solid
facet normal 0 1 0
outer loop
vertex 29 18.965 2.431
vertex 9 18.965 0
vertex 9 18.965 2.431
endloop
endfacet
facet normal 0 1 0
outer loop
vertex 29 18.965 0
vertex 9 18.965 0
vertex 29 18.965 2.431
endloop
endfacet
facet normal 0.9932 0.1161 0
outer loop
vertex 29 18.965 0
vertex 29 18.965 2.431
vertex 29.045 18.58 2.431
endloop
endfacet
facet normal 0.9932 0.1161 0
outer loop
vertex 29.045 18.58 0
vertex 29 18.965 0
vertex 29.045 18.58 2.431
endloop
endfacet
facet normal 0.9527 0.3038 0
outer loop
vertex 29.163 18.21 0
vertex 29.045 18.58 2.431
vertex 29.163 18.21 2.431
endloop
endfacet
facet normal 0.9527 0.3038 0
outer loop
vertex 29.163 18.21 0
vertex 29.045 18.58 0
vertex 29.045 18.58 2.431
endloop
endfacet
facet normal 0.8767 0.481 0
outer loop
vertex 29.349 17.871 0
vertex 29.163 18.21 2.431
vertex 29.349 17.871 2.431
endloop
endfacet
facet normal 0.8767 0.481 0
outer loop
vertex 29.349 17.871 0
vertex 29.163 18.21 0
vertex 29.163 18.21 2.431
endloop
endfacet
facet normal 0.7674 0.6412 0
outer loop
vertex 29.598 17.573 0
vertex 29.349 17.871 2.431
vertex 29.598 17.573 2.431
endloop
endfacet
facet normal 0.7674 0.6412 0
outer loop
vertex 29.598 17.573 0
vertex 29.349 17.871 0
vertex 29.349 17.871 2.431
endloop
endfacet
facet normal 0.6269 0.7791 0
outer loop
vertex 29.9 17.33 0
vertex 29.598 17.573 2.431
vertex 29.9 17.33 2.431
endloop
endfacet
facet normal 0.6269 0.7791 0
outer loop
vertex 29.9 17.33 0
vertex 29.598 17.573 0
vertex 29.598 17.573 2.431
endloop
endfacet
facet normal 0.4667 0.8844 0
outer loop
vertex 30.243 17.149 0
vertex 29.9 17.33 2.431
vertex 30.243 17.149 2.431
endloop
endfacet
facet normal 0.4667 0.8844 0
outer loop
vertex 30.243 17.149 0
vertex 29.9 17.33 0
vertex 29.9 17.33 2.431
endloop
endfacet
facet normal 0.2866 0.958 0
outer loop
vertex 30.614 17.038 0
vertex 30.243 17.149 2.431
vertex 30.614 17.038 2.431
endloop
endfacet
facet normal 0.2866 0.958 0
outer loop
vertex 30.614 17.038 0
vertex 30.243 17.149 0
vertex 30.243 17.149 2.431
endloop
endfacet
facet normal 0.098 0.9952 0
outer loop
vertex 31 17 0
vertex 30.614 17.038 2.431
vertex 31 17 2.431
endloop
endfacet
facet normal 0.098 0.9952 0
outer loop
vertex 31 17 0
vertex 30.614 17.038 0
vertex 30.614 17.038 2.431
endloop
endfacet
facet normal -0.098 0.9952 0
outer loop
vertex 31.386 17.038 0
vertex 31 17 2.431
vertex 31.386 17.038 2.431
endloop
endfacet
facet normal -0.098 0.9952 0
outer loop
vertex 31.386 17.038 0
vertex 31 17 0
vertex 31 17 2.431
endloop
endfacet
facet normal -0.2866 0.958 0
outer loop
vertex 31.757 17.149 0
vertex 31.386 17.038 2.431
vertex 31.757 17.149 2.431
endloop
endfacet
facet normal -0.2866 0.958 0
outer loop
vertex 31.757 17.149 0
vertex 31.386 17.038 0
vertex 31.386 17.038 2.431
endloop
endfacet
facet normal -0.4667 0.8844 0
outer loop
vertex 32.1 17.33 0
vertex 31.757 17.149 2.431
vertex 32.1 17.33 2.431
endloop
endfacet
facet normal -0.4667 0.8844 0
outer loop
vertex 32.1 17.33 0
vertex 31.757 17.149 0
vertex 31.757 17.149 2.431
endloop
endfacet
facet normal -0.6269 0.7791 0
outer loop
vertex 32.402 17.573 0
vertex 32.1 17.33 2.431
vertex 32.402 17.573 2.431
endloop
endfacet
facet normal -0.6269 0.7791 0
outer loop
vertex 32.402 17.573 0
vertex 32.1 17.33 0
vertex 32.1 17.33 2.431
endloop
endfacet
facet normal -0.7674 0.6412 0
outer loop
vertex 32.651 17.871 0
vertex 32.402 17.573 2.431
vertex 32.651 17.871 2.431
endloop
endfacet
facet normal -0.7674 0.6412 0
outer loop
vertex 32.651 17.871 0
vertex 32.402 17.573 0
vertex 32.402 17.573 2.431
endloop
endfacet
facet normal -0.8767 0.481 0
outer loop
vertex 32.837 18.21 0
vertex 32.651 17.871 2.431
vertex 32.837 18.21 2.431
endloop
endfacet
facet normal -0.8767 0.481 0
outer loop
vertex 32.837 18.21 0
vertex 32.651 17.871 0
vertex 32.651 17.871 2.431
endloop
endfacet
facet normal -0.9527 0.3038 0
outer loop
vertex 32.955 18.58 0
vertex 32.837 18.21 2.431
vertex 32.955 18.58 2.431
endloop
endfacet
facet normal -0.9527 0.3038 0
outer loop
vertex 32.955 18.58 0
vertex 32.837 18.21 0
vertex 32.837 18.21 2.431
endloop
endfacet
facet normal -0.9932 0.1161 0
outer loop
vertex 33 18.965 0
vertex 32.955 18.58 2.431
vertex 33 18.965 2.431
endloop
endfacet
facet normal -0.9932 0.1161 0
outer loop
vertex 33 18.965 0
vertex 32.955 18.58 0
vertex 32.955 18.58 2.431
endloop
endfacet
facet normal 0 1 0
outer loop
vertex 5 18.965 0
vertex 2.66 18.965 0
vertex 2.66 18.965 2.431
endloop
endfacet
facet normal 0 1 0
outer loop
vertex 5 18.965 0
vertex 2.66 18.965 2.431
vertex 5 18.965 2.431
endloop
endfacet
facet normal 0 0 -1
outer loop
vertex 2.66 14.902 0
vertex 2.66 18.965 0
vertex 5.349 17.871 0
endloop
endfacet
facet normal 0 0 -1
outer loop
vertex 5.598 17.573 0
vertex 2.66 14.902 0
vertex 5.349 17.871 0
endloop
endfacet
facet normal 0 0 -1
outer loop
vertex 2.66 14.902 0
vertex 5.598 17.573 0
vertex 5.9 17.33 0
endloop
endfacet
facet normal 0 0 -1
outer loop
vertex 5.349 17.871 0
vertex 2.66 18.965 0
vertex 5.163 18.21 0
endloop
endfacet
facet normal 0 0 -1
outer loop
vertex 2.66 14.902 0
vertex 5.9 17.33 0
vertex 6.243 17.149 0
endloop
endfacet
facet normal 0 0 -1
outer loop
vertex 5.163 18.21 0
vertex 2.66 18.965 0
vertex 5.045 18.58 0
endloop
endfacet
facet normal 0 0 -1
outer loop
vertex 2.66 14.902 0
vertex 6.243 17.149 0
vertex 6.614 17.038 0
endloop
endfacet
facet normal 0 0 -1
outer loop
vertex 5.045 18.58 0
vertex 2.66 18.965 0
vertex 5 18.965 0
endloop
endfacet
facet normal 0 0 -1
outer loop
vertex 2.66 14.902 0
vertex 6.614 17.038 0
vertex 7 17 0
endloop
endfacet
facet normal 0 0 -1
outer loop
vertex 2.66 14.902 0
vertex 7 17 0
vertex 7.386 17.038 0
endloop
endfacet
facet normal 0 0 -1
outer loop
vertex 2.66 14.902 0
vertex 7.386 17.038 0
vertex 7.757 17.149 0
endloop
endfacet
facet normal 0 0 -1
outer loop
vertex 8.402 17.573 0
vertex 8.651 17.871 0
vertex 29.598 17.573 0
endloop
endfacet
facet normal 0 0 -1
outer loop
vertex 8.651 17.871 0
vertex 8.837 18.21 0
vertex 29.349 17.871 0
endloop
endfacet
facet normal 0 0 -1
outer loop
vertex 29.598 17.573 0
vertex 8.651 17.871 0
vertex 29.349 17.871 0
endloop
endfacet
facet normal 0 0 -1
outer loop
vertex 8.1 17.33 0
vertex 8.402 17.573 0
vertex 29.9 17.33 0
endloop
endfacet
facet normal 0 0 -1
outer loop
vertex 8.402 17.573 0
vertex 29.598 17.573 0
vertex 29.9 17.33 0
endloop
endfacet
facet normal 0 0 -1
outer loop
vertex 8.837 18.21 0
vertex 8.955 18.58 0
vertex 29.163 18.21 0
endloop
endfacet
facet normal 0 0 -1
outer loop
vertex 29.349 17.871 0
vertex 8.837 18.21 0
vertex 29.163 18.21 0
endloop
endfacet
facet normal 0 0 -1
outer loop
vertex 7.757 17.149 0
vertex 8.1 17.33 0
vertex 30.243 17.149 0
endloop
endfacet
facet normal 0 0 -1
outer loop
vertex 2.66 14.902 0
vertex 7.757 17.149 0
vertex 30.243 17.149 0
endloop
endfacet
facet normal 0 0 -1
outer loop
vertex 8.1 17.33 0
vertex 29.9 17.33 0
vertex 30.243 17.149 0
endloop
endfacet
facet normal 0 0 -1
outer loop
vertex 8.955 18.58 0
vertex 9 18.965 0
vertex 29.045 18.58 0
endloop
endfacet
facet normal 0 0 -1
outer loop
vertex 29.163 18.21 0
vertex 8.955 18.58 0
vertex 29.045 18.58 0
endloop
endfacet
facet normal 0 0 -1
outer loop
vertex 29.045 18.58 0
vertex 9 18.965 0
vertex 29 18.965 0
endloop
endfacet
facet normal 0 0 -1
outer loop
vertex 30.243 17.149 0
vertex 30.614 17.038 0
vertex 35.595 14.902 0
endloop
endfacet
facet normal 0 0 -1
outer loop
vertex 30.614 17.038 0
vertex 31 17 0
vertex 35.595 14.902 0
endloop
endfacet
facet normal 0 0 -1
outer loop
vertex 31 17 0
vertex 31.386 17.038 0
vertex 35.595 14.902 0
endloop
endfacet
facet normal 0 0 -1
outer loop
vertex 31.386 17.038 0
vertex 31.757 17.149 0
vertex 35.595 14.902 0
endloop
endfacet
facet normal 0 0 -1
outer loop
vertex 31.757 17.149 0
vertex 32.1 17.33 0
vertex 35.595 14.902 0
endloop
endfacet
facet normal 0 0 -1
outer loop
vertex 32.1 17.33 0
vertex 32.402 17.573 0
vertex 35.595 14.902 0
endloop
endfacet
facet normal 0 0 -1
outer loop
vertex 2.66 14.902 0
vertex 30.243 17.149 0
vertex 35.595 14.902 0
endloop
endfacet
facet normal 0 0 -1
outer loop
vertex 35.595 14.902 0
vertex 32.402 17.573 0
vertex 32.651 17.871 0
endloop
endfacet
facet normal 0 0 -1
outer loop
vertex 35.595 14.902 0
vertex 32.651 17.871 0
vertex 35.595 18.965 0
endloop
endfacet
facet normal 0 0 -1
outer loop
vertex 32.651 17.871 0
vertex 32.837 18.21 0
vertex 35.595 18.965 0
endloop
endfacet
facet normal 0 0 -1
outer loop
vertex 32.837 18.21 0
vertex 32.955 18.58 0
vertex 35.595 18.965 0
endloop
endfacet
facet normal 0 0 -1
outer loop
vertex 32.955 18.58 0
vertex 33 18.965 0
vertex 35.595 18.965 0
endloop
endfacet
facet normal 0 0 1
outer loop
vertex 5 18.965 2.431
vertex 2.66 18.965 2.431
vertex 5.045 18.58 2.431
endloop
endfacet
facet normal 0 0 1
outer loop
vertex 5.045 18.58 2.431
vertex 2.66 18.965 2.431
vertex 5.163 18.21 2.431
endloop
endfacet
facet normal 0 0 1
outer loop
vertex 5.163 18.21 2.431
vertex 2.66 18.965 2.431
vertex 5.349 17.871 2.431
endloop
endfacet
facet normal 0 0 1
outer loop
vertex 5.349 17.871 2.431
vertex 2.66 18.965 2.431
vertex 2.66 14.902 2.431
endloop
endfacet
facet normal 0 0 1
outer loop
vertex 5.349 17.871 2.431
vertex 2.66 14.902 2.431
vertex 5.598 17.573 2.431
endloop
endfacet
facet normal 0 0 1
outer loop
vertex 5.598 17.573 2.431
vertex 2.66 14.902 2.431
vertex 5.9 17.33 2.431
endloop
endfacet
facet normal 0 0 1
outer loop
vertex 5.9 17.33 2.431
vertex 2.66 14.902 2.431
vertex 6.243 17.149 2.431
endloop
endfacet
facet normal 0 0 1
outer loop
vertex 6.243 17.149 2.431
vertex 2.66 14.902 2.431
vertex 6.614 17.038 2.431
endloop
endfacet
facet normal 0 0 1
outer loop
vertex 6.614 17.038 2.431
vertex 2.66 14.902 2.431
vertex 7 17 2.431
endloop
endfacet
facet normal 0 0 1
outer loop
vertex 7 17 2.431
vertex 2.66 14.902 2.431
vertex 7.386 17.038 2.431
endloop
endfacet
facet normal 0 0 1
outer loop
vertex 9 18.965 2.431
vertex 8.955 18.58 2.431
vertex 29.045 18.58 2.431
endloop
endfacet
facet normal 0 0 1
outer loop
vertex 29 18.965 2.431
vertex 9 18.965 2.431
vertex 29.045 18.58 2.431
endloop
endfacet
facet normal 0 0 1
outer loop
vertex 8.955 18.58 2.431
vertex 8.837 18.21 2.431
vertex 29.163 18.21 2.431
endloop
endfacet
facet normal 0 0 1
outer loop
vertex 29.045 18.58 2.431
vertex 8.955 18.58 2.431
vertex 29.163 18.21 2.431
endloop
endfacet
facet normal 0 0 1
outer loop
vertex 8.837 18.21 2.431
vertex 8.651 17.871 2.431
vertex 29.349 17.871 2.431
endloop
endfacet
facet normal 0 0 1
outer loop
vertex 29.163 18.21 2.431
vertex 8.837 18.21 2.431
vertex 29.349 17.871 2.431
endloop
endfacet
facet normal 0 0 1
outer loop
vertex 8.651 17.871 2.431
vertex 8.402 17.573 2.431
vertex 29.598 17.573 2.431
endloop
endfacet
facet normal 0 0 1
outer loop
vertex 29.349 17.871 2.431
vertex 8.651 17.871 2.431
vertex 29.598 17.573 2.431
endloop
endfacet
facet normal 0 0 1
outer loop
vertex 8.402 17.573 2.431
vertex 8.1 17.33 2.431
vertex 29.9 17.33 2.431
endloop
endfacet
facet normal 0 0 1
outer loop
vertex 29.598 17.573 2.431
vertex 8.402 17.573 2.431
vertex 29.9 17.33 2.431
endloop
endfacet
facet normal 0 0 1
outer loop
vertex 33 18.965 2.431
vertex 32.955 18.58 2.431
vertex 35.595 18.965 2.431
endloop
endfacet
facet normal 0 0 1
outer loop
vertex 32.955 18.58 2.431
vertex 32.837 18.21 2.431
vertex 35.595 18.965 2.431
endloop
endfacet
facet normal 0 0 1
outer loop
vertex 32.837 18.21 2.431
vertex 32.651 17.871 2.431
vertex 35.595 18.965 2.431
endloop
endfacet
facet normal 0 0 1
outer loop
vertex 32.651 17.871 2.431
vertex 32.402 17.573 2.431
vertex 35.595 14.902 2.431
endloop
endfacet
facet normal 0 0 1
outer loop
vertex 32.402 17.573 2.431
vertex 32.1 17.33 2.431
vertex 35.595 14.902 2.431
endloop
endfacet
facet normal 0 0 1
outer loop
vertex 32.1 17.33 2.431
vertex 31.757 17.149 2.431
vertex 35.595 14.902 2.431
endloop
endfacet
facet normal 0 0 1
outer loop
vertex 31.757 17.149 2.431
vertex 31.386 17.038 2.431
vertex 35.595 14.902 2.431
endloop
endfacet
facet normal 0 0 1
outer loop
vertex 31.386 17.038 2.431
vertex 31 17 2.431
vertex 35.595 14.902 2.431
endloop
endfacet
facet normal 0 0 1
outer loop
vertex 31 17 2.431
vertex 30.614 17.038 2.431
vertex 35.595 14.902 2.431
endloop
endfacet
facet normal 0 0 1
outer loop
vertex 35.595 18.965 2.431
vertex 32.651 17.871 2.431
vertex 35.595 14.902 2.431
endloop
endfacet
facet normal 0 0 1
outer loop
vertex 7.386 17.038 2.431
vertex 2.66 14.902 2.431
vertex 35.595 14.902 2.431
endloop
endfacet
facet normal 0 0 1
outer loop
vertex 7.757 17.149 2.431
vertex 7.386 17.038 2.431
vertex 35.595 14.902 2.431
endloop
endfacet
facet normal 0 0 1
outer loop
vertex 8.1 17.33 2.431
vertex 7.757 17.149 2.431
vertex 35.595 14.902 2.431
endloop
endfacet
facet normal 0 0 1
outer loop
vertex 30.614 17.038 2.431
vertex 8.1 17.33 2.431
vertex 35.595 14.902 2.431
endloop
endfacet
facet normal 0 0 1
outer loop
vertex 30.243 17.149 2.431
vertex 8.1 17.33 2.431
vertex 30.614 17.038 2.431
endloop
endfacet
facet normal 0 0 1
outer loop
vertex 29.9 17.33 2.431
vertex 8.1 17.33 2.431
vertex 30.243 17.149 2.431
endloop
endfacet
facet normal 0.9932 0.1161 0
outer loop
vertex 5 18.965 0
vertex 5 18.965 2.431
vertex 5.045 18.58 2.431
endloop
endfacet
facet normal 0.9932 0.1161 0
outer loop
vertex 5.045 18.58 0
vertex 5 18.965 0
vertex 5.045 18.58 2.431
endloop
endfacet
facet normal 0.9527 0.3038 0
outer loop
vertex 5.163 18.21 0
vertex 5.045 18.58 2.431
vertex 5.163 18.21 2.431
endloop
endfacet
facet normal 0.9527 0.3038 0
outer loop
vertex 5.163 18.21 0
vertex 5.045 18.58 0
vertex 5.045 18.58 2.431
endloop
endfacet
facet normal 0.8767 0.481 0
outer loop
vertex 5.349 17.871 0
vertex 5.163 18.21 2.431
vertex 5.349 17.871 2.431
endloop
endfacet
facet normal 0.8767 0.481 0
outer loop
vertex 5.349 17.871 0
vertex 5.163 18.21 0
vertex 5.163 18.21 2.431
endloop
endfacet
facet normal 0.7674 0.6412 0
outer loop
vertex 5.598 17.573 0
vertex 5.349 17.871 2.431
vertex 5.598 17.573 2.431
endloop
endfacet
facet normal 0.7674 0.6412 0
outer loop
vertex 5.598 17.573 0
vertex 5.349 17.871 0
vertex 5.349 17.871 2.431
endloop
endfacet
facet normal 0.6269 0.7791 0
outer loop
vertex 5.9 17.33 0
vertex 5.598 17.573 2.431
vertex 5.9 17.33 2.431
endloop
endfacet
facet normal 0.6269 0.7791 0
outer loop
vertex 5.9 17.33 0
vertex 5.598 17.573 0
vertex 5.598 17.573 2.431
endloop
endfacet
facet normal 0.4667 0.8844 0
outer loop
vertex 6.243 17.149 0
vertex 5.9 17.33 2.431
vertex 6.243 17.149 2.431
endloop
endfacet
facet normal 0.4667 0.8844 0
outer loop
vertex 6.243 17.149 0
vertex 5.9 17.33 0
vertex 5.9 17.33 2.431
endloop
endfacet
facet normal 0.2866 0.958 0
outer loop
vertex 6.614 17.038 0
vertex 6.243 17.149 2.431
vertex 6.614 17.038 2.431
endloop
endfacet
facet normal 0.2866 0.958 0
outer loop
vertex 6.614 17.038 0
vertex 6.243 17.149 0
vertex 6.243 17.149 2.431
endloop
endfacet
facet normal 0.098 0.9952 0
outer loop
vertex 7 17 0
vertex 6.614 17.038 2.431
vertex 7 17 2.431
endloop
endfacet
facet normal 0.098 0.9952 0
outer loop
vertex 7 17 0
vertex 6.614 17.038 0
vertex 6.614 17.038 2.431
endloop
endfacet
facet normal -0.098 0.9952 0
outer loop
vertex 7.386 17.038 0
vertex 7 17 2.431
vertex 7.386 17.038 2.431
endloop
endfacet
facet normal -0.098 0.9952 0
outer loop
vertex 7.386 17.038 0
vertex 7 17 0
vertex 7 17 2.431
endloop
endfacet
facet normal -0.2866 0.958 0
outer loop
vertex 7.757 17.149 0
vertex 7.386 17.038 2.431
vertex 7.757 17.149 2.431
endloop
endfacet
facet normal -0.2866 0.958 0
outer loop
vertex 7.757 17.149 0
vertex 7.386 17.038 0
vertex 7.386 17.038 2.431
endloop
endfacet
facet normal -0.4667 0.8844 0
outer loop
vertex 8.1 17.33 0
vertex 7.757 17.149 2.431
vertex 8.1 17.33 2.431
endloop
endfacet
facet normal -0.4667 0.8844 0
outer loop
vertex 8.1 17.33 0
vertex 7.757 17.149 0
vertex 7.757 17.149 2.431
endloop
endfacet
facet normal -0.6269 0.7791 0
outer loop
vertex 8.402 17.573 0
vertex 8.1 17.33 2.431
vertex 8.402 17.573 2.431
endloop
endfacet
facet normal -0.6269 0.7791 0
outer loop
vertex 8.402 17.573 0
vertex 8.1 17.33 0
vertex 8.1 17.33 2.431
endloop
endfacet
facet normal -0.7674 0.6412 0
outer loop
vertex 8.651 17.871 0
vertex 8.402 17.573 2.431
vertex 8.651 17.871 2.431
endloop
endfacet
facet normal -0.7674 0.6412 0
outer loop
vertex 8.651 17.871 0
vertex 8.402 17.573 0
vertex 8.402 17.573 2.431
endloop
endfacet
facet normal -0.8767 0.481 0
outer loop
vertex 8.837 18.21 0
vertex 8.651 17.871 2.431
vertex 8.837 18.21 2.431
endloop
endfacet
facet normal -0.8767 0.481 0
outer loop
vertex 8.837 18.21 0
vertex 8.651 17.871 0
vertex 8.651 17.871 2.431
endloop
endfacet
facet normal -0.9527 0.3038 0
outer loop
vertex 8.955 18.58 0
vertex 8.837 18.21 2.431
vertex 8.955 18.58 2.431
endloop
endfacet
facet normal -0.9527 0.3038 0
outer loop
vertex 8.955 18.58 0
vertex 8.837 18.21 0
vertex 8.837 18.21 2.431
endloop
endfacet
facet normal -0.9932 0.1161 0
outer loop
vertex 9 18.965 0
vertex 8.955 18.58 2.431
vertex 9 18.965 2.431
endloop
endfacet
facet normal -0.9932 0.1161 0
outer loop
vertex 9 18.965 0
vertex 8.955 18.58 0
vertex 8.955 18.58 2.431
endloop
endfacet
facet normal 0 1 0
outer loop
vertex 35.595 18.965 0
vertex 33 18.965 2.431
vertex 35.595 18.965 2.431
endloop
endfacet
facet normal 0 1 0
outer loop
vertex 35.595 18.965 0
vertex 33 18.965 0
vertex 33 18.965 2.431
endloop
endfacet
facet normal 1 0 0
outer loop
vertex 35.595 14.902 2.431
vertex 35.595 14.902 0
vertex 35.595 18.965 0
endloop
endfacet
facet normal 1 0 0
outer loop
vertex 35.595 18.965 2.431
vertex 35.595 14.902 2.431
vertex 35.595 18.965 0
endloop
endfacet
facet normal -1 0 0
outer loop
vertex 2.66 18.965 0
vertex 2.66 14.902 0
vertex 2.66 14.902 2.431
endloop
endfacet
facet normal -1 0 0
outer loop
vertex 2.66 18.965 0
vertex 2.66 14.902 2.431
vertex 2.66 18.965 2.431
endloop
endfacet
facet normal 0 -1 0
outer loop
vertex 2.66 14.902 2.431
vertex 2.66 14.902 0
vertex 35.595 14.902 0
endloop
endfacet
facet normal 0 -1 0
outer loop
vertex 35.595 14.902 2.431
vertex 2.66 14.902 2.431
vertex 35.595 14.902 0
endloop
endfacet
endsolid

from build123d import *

# Parameters (mm, degrees)
SKETCH_R        = 2
PAD_DEPTH       = 4
SKETCH001_W     = 50
SKETCH001_H     = 3
PAD001_DEPTH    = 4
SKETCH002_R     = 2
PAD002_DEPTH    = 11
SKETCH003_W     = 57.312547
SKETCH003_H     = 35.48627
SKETCH003_W_2   = 32.934865
SKETCH003_H_2   = 4.062765
POCKET_DEPTH    = 11.001
SKETCH004_W     = 47.141797
SKETCH004_H     = 11.210097
POCKET001_DEPTH = 18.965808


with BuildPart() as part:
    # Sketch → Pad (new body)
    with BuildSketch(Plane.XY):
        with BuildLine():
            Line((10, 0), (40, 0))
            ThreePointArc((40, 0), (47.071068, 2.928932), (50, 10))
            Line((50, 10), (50, 22))
            Line((50, 22), (0, 22))
            Line((0, 22), (0, 10))
            ThreePointArc((0, 10), (2.928932, 2.928932), (10, 0))
        make_face()
        with Locations((7, 19)):
            Circle(SKETCH_R, mode=Mode.SUBTRACT)
        with Locations((31, 19)):
            Circle(SKETCH_R, mode=Mode.SUBTRACT)
    extrude(amount=PAD_DEPTH)

    # Sketch001 → Pad001 (join)
    with BuildSketch(Plane.XY):
        with Locations((25, 23.5)):
            Rectangle(SKETCH001_W, SKETCH001_H)
    extrude(amount=PAD001_DEPTH)

    # Sketch002 → Pad002 (join)
    with BuildSketch(Plane.XY):
        with BuildLine():
            Line((50, 11), (50, 22))
            Line((50, 22), (35, 22))
            ThreePointArc((35, 22), (31, 24), (27, 22))
            Line((27, 22), (11, 22))
            ThreePointArc((11, 22), (7, 24), (3, 22))
            Line((3, 22), (0, 22))
            Line((0, 22), (0, 11))
            Line((0, 11), (50, 11))
        make_face()
        with Locations((7, 19)):
            Circle(SKETCH002_R, mode=Mode.SUBTRACT)
        with Locations((31, 19)):
            Circle(SKETCH002_R, mode=Mode.SUBTRACT)
    extrude(amount=PAD002_DEPTH)

    # Sketch003 → Pocket (cut, through all)
    with BuildSketch(Plane.XY):
        with Locations((25.477233, 12.877207)):
            Rectangle(SKETCH003_W, SKETCH003_H)
        with Locations((19.127612, 16.933425)):
            Rectangle(SKETCH003_W_2, SKETCH003_H_2, mode=Mode.SUBTRACT)
    extrude(amount=POCKET_DEPTH, mode=Mode.SUBTRACT)

    # Sketch004 → Pocket001 (cut, through all)
    with BuildSketch(Plane.XZ):
        with Locations((17.359044, 8.036307)):
            Rectangle(SKETCH004_W, SKETCH004_H)
    extrude(amount=-POCKET001_DEPTH, mode=Mode.SUBTRACT)


solid = part.part
